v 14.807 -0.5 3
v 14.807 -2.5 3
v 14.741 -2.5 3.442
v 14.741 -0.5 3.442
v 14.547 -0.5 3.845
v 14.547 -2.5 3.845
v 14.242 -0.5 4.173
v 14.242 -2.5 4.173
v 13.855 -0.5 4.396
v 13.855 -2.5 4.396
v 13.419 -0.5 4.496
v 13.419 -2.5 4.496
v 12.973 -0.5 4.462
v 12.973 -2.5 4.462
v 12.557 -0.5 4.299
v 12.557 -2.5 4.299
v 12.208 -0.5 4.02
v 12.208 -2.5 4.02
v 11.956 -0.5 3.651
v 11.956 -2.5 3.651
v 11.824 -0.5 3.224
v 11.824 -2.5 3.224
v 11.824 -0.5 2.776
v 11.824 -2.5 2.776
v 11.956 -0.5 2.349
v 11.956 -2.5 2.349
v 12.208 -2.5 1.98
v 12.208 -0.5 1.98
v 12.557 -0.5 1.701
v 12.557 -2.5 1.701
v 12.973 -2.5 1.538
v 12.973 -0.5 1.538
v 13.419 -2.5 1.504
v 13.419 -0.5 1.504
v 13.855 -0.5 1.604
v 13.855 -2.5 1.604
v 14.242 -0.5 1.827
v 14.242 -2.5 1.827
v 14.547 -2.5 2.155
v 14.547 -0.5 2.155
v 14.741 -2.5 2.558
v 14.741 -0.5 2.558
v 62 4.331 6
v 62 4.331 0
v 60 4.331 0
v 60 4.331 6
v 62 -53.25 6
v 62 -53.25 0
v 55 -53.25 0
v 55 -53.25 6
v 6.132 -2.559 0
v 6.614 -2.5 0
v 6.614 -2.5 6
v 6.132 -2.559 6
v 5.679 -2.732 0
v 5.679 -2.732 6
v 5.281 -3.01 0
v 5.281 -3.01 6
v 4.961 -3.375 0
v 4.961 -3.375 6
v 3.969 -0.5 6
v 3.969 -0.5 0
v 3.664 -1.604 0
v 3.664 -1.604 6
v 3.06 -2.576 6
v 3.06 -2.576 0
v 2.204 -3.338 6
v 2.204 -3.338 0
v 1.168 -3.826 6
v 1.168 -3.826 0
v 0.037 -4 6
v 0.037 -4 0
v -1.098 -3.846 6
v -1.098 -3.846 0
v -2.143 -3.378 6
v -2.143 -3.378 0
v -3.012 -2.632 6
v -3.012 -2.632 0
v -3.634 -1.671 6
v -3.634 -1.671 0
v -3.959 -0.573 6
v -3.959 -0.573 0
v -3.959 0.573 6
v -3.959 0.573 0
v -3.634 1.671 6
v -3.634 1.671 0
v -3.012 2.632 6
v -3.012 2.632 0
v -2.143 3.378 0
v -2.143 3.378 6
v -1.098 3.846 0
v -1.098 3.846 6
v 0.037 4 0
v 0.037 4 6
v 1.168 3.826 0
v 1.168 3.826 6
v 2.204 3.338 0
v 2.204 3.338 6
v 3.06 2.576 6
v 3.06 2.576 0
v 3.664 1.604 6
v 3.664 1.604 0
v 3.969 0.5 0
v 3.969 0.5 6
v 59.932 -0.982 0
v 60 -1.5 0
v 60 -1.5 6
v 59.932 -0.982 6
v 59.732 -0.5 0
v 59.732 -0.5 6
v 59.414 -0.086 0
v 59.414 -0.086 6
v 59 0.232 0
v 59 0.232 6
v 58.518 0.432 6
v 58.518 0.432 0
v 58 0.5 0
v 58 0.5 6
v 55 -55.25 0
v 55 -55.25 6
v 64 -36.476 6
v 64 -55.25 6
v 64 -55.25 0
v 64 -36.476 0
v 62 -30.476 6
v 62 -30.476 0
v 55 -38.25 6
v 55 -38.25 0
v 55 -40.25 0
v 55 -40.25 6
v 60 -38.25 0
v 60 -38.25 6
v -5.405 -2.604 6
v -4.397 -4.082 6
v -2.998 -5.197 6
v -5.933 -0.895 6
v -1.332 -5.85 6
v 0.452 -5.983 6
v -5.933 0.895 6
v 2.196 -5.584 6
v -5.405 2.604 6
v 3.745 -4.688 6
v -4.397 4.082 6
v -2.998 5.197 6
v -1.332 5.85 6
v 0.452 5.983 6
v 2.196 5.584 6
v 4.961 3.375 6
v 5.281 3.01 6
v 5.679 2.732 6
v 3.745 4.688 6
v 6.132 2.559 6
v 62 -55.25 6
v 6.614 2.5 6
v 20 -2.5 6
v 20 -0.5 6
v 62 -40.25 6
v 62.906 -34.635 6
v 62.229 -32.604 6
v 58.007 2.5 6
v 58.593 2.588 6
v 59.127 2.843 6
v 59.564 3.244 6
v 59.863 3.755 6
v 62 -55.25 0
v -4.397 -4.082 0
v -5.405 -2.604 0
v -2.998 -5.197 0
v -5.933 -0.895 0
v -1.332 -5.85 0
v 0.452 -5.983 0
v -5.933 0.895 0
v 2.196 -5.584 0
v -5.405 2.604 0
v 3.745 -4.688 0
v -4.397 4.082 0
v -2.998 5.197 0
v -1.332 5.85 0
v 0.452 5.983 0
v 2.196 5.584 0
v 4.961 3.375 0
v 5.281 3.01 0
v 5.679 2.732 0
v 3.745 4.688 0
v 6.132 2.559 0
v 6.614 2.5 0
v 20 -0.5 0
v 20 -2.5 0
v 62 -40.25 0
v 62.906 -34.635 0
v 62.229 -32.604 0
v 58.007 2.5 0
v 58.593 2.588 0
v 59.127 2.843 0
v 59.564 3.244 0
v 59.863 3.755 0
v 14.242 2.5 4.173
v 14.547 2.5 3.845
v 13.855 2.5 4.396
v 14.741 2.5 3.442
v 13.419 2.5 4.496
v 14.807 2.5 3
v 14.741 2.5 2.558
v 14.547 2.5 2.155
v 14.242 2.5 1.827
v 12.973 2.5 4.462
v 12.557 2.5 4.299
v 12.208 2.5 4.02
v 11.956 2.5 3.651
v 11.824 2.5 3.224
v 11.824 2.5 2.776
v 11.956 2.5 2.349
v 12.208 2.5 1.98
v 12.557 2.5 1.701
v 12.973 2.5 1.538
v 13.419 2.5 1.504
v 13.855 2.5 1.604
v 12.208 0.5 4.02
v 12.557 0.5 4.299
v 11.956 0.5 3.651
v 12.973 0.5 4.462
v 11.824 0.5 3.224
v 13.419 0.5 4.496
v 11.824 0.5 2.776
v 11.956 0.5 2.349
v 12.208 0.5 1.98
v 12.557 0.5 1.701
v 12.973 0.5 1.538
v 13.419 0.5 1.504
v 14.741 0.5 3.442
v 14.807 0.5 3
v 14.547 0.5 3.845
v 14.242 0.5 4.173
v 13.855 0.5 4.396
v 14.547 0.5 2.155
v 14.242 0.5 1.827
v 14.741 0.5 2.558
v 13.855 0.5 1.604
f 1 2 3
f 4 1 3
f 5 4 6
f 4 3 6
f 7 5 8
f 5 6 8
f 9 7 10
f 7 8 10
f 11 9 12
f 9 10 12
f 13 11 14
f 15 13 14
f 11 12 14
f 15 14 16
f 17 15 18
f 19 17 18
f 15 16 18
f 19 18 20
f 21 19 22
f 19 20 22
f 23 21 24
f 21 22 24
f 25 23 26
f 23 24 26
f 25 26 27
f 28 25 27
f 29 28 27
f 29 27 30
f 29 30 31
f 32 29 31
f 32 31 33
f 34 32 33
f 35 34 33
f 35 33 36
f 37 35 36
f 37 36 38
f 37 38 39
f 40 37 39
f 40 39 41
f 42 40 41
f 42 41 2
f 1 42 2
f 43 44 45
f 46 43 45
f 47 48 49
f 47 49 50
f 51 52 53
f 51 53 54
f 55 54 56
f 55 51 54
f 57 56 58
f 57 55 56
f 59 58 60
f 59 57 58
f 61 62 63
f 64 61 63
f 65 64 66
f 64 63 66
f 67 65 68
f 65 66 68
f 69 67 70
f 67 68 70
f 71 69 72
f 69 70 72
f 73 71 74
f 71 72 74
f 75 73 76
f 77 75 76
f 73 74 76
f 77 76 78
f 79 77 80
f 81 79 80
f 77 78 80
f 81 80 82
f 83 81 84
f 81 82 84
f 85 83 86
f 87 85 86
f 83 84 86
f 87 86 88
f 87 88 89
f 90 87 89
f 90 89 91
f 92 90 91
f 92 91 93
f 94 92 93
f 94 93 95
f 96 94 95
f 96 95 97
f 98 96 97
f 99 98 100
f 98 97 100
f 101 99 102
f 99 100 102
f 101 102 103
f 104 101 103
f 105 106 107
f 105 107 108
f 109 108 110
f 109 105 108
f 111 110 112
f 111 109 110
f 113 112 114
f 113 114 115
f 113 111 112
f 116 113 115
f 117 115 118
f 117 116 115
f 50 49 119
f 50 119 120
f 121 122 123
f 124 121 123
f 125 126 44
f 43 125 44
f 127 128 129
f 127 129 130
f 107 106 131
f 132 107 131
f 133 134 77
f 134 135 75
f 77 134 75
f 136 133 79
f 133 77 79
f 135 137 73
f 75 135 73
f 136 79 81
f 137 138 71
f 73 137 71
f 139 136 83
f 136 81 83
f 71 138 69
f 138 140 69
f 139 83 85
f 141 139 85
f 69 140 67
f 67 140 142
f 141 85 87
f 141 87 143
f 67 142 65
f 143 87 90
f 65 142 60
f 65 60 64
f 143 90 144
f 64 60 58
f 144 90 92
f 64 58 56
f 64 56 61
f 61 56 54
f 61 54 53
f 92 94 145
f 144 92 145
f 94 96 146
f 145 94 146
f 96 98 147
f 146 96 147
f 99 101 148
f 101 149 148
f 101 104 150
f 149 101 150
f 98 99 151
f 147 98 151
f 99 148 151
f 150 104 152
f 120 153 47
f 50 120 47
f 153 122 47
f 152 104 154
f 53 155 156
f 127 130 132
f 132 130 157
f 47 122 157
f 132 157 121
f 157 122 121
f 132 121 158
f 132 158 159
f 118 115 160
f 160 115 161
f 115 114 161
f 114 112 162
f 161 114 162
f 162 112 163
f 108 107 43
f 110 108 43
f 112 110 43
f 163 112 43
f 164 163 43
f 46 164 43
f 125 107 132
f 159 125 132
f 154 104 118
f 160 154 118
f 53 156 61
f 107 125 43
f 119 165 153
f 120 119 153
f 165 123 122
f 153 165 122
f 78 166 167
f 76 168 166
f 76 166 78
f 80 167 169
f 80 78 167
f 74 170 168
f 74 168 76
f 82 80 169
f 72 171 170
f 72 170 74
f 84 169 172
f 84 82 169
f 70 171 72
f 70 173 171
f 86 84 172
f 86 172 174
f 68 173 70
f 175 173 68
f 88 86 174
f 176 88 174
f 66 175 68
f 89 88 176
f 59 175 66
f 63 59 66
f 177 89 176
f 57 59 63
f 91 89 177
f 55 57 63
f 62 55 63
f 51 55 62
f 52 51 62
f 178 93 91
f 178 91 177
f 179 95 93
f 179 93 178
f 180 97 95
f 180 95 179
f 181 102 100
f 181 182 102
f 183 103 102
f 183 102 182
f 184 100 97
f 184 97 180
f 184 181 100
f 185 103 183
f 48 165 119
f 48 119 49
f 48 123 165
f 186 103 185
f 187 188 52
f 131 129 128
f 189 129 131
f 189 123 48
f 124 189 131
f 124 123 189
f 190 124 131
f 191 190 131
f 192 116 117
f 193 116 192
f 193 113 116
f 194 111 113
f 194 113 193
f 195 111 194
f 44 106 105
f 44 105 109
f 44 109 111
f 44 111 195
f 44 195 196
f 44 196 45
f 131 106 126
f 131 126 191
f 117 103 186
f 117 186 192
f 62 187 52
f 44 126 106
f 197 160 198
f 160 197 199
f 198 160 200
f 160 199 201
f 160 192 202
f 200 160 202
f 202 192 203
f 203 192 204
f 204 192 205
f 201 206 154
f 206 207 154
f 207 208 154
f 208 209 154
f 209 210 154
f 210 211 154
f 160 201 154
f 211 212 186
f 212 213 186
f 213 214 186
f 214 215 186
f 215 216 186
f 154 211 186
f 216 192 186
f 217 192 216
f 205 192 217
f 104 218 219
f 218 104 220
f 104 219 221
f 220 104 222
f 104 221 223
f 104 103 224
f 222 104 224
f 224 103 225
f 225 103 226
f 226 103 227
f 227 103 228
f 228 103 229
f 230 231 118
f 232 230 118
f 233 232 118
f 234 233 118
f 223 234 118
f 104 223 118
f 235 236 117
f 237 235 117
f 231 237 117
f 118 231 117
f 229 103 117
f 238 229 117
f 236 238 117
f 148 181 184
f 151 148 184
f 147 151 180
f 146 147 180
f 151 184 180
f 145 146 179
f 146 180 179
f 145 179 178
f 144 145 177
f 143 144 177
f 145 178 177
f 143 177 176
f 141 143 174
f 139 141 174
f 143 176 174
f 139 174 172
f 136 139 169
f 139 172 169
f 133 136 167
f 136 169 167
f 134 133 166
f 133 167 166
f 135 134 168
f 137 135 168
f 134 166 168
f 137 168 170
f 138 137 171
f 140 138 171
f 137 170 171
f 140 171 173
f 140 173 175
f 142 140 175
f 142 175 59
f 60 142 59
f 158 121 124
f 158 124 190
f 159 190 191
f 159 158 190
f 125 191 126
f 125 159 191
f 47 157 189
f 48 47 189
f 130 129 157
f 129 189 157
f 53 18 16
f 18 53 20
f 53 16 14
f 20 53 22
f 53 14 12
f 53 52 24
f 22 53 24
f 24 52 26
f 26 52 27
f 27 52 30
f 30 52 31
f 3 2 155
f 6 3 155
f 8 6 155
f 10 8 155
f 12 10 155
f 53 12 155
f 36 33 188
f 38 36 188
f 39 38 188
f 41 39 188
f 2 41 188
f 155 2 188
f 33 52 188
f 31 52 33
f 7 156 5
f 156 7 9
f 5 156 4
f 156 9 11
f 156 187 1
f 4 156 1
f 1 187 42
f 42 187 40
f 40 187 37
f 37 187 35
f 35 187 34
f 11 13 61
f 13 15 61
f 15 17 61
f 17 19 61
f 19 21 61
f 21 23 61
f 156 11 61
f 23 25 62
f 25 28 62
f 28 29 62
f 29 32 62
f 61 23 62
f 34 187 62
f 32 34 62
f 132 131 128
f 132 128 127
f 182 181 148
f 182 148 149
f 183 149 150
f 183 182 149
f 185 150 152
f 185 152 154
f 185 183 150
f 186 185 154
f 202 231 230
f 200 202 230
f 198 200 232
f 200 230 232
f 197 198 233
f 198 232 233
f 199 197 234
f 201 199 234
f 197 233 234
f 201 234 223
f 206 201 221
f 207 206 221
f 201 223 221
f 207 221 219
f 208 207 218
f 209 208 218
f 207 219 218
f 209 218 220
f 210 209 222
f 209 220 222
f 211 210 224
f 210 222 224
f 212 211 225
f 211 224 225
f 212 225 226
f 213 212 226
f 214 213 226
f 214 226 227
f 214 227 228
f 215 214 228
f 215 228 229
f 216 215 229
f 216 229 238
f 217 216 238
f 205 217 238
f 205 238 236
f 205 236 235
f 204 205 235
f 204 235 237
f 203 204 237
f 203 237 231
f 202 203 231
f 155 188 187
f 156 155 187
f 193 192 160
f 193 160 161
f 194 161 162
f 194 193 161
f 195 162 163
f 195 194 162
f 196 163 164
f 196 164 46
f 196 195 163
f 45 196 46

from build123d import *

# Parameters (mm, degrees)
BOSS_EXTRUDE1_DEPTH = 6
FILLET1_R           = 2
SKETCH2_R           = 1.5
CUT_EXTRUDE1_DEPTH  = 10
SKETCH3_W           = 6
SKETCH3_H           = 18.774257397
BOSS_EXTRUDE2_DEPTH = 2
FILLET2_R           = 10
SKETCH4_W           = 6
SKETCH4_H           = 2
BOSS_EXTRUDE3_DEPTH = 5
SKETCH5_W           = 6
SKETCH5_H           = 2
BOSS_EXTRUDE4_DEPTH = 7


with BuildPart() as part:
    # Sketch1 → Boss-Extrude1 (new body)
    with BuildSketch(Plane.XY):
        with BuildLine():
            Line((4.974937186, 0.5), (9.527119886, 0.5))
            Line((9.527119886, 0.5), (60, 0.5))
            Line((60, 0.5), (60, -40.25))
            Line((60, -40.25), (62, -40.25))
            Line((62, -40.25), (62, 4.331195296))
            Line((62, 4.331195296), (60, 4.331195296))
            Line((60, 4.331195296), (60, 2.5))
            Line((60, 2.5), (5.454356057, 2.5))
            ThreePointArc((5.454356057, 2.5), (-6, 0), (5.454356057, -2.5))
            Line((5.454356057, -2.5), (20, -2.5))
            Line((20, -2.5), (20, -0.5))
            Line((20, -0.5), (4.974937186, -0.5))
            Line((4.974937186, -0.5), (3.968626967, -0.5))
            ThreePointArc((3.968626967, -0.5), (-4, 0), (3.968626967, 0.5))
            Line((3.968626967, 0.5), (4.974937186, 0.5))
        make_face()
    extrude(amount=BOSS_EXTRUDE1_DEPTH)

    # Fillet1
    # the kernel refuses this fillet: 2 mm, written as the material it adds along each edge
    with BuildSketch(Plane(origin=(5.454356057, -2.5, 0), x_dir=(1, 0, 0), z_dir=(0, 0, 1))) as fillet1_piece_1:
        with BuildLine():
            CenterArc((1.16002222, -2), FILLET1_R, 90, 55.771133672)
            Line((-0.493572349, -0.875), (-0.52664424, -0.8525))
            ThreePointArc((-0.52664424, -0.8525), (-0.26328023, -0.428195989), (-0.036362374, 0.016666667))
            Line((-0.036362374, 0.016666667), (0, 0.04))
            Line((0, 0.04), (1.16002222, 0.04))
            Line((1.16002222, 0.04), (1.16002222, 0))
        make_face()
    extrude(amount=6)
    with BuildSketch(Plane(origin=(5.454356057, 2.5, 0), x_dir=(-0.491308051869414, 0.8709858771348026, 0), z_dir=(0, 0, 1))) as fillet1_piece_2:
        with BuildLine():
            CenterArc((1.172043497, -1.992979075), FILLET1_R, 94.802273988, 55.771133672)
            Line((-0.569928257, -1.010362971), (-0.604767692, -0.990710649))
            Line((-0.604767692, -0.990710649), (-0.034839435, 0.019652322))
            Line((-0.034839435, 0.019652322), (0.003348696, 0.039859581))
            ThreePointArc((0.003348696, 0.039859581), (0.502304356, 0.018937224), (1.001260016, 0.039859581))
            Line((1.001260016, 0.039859581), (1.004608712, 0))
        make_face()
    extrude(amount=6)
    with BuildSketch(Plane(origin=(60, 2.5, 0), x_dir=(-1, 0, 0), z_dir=(0, 0, 1))) as fillet1_piece_3:
        with BuildLine():
            CenterArc((1.992863511, -2), FILLET1_R, 90, 85.158341327)
            Line((0, -1.831195296), (-0.03985727, -1.827819202))
            ThreePointArc((-0.03985727, -1.827819202), (-0.04, -0.915597648), (-0.04, 0))
            Line((-0.04, 0), (0, 0.04))
            Line((0, 0.04), (1.992863511, 0.04))
            Line((1.992863511, 0.04), (1.992863511, 0))
        make_face()
    extrude(amount=6)
    with BuildSketch(Plane(origin=(60, 0.5, 0), x_dir=(-1, 0, 0), z_dir=(0, 0, 1))) as fillet1_piece_4:
        with BuildLine():
            CenterArc((FILLET1_R, FILLET1_R), FILLET1_R, 180, 90)
            Line((0, FILLET1_R), (-FILLET1_R * 0.02, FILLET1_R))
            Line((-FILLET1_R * 0.02, FILLET1_R), (-FILLET1_R * 0.02, -FILLET1_R * 0.02))
            Line((-FILLET1_R * 0.02, -FILLET1_R * 0.02), (FILLET1_R, -FILLET1_R * 0.02))
            Line((FILLET1_R, -FILLET1_R * 0.02), (FILLET1_R, 0))
        make_face()
    extrude(amount=6)

    # Sketch2 → Cut-Extrude1 (cut)
    with BuildSketch(Plane.XZ.offset(2.5)):
        with Locations((13.307189139, 3)):
            Circle(SKETCH2_R)
    extrude(amount=-CUT_EXTRUDE1_DEPTH, mode=Mode.SUBTRACT)

    # Sketch3 → Boss-Extrude2 (add)
    with BuildSketch(Plane(origin=(62, 0, 0), x_dir=(0, 0, -1), z_dir=(1, 0, 0))):
        with Locations((-3, -45.862871302)):
            Rectangle(SKETCH3_W, SKETCH3_H)
    extrude(amount=BOSS_EXTRUDE2_DEPTH)

    # Fillet2
    # the kernel refuses this fillet: 10 mm, written as the material it adds along each edge
    with BuildSketch(Plane(origin=(62, -36.475742603, 6), x_dir=(0, 1, 0), z_dir=(0, 0, -1))) as fillet2_piece_1:
        with BuildLine():
            CenterArc((6, 10), FILLET2_R, 233.130102354, 36.869897646)
            Line((0, 2), (-0.12, 1.84))
            ThreePointArc((-0.12, 1.84), (-0.2, 1), (-0.2, 0))
            Line((-0.2, 0), (0, -0.2))
            Line((0, -0.2), (6, -0.2))
            Line((6, -0.2), (6, 0))
        make_face()
    extrude(amount=6)

    # Sketch4 → Boss-Extrude3 (add)
    with BuildSketch(Plane.ZY.offset(-60)):
        with Locations((3, -39.25)):
            Rectangle(SKETCH4_W, SKETCH4_H)
    extrude(amount=BOSS_EXTRUDE3_DEPTH)

    # Sketch5 → Boss-Extrude4 (add)
    with BuildSketch(Plane.ZY.offset(-62)):
        with Locations((3, -54.25)):
            Rectangle(SKETCH5_W, SKETCH5_H)
    extrude(amount=BOSS_EXTRUDE4_DEPTH)


solid = part.part
